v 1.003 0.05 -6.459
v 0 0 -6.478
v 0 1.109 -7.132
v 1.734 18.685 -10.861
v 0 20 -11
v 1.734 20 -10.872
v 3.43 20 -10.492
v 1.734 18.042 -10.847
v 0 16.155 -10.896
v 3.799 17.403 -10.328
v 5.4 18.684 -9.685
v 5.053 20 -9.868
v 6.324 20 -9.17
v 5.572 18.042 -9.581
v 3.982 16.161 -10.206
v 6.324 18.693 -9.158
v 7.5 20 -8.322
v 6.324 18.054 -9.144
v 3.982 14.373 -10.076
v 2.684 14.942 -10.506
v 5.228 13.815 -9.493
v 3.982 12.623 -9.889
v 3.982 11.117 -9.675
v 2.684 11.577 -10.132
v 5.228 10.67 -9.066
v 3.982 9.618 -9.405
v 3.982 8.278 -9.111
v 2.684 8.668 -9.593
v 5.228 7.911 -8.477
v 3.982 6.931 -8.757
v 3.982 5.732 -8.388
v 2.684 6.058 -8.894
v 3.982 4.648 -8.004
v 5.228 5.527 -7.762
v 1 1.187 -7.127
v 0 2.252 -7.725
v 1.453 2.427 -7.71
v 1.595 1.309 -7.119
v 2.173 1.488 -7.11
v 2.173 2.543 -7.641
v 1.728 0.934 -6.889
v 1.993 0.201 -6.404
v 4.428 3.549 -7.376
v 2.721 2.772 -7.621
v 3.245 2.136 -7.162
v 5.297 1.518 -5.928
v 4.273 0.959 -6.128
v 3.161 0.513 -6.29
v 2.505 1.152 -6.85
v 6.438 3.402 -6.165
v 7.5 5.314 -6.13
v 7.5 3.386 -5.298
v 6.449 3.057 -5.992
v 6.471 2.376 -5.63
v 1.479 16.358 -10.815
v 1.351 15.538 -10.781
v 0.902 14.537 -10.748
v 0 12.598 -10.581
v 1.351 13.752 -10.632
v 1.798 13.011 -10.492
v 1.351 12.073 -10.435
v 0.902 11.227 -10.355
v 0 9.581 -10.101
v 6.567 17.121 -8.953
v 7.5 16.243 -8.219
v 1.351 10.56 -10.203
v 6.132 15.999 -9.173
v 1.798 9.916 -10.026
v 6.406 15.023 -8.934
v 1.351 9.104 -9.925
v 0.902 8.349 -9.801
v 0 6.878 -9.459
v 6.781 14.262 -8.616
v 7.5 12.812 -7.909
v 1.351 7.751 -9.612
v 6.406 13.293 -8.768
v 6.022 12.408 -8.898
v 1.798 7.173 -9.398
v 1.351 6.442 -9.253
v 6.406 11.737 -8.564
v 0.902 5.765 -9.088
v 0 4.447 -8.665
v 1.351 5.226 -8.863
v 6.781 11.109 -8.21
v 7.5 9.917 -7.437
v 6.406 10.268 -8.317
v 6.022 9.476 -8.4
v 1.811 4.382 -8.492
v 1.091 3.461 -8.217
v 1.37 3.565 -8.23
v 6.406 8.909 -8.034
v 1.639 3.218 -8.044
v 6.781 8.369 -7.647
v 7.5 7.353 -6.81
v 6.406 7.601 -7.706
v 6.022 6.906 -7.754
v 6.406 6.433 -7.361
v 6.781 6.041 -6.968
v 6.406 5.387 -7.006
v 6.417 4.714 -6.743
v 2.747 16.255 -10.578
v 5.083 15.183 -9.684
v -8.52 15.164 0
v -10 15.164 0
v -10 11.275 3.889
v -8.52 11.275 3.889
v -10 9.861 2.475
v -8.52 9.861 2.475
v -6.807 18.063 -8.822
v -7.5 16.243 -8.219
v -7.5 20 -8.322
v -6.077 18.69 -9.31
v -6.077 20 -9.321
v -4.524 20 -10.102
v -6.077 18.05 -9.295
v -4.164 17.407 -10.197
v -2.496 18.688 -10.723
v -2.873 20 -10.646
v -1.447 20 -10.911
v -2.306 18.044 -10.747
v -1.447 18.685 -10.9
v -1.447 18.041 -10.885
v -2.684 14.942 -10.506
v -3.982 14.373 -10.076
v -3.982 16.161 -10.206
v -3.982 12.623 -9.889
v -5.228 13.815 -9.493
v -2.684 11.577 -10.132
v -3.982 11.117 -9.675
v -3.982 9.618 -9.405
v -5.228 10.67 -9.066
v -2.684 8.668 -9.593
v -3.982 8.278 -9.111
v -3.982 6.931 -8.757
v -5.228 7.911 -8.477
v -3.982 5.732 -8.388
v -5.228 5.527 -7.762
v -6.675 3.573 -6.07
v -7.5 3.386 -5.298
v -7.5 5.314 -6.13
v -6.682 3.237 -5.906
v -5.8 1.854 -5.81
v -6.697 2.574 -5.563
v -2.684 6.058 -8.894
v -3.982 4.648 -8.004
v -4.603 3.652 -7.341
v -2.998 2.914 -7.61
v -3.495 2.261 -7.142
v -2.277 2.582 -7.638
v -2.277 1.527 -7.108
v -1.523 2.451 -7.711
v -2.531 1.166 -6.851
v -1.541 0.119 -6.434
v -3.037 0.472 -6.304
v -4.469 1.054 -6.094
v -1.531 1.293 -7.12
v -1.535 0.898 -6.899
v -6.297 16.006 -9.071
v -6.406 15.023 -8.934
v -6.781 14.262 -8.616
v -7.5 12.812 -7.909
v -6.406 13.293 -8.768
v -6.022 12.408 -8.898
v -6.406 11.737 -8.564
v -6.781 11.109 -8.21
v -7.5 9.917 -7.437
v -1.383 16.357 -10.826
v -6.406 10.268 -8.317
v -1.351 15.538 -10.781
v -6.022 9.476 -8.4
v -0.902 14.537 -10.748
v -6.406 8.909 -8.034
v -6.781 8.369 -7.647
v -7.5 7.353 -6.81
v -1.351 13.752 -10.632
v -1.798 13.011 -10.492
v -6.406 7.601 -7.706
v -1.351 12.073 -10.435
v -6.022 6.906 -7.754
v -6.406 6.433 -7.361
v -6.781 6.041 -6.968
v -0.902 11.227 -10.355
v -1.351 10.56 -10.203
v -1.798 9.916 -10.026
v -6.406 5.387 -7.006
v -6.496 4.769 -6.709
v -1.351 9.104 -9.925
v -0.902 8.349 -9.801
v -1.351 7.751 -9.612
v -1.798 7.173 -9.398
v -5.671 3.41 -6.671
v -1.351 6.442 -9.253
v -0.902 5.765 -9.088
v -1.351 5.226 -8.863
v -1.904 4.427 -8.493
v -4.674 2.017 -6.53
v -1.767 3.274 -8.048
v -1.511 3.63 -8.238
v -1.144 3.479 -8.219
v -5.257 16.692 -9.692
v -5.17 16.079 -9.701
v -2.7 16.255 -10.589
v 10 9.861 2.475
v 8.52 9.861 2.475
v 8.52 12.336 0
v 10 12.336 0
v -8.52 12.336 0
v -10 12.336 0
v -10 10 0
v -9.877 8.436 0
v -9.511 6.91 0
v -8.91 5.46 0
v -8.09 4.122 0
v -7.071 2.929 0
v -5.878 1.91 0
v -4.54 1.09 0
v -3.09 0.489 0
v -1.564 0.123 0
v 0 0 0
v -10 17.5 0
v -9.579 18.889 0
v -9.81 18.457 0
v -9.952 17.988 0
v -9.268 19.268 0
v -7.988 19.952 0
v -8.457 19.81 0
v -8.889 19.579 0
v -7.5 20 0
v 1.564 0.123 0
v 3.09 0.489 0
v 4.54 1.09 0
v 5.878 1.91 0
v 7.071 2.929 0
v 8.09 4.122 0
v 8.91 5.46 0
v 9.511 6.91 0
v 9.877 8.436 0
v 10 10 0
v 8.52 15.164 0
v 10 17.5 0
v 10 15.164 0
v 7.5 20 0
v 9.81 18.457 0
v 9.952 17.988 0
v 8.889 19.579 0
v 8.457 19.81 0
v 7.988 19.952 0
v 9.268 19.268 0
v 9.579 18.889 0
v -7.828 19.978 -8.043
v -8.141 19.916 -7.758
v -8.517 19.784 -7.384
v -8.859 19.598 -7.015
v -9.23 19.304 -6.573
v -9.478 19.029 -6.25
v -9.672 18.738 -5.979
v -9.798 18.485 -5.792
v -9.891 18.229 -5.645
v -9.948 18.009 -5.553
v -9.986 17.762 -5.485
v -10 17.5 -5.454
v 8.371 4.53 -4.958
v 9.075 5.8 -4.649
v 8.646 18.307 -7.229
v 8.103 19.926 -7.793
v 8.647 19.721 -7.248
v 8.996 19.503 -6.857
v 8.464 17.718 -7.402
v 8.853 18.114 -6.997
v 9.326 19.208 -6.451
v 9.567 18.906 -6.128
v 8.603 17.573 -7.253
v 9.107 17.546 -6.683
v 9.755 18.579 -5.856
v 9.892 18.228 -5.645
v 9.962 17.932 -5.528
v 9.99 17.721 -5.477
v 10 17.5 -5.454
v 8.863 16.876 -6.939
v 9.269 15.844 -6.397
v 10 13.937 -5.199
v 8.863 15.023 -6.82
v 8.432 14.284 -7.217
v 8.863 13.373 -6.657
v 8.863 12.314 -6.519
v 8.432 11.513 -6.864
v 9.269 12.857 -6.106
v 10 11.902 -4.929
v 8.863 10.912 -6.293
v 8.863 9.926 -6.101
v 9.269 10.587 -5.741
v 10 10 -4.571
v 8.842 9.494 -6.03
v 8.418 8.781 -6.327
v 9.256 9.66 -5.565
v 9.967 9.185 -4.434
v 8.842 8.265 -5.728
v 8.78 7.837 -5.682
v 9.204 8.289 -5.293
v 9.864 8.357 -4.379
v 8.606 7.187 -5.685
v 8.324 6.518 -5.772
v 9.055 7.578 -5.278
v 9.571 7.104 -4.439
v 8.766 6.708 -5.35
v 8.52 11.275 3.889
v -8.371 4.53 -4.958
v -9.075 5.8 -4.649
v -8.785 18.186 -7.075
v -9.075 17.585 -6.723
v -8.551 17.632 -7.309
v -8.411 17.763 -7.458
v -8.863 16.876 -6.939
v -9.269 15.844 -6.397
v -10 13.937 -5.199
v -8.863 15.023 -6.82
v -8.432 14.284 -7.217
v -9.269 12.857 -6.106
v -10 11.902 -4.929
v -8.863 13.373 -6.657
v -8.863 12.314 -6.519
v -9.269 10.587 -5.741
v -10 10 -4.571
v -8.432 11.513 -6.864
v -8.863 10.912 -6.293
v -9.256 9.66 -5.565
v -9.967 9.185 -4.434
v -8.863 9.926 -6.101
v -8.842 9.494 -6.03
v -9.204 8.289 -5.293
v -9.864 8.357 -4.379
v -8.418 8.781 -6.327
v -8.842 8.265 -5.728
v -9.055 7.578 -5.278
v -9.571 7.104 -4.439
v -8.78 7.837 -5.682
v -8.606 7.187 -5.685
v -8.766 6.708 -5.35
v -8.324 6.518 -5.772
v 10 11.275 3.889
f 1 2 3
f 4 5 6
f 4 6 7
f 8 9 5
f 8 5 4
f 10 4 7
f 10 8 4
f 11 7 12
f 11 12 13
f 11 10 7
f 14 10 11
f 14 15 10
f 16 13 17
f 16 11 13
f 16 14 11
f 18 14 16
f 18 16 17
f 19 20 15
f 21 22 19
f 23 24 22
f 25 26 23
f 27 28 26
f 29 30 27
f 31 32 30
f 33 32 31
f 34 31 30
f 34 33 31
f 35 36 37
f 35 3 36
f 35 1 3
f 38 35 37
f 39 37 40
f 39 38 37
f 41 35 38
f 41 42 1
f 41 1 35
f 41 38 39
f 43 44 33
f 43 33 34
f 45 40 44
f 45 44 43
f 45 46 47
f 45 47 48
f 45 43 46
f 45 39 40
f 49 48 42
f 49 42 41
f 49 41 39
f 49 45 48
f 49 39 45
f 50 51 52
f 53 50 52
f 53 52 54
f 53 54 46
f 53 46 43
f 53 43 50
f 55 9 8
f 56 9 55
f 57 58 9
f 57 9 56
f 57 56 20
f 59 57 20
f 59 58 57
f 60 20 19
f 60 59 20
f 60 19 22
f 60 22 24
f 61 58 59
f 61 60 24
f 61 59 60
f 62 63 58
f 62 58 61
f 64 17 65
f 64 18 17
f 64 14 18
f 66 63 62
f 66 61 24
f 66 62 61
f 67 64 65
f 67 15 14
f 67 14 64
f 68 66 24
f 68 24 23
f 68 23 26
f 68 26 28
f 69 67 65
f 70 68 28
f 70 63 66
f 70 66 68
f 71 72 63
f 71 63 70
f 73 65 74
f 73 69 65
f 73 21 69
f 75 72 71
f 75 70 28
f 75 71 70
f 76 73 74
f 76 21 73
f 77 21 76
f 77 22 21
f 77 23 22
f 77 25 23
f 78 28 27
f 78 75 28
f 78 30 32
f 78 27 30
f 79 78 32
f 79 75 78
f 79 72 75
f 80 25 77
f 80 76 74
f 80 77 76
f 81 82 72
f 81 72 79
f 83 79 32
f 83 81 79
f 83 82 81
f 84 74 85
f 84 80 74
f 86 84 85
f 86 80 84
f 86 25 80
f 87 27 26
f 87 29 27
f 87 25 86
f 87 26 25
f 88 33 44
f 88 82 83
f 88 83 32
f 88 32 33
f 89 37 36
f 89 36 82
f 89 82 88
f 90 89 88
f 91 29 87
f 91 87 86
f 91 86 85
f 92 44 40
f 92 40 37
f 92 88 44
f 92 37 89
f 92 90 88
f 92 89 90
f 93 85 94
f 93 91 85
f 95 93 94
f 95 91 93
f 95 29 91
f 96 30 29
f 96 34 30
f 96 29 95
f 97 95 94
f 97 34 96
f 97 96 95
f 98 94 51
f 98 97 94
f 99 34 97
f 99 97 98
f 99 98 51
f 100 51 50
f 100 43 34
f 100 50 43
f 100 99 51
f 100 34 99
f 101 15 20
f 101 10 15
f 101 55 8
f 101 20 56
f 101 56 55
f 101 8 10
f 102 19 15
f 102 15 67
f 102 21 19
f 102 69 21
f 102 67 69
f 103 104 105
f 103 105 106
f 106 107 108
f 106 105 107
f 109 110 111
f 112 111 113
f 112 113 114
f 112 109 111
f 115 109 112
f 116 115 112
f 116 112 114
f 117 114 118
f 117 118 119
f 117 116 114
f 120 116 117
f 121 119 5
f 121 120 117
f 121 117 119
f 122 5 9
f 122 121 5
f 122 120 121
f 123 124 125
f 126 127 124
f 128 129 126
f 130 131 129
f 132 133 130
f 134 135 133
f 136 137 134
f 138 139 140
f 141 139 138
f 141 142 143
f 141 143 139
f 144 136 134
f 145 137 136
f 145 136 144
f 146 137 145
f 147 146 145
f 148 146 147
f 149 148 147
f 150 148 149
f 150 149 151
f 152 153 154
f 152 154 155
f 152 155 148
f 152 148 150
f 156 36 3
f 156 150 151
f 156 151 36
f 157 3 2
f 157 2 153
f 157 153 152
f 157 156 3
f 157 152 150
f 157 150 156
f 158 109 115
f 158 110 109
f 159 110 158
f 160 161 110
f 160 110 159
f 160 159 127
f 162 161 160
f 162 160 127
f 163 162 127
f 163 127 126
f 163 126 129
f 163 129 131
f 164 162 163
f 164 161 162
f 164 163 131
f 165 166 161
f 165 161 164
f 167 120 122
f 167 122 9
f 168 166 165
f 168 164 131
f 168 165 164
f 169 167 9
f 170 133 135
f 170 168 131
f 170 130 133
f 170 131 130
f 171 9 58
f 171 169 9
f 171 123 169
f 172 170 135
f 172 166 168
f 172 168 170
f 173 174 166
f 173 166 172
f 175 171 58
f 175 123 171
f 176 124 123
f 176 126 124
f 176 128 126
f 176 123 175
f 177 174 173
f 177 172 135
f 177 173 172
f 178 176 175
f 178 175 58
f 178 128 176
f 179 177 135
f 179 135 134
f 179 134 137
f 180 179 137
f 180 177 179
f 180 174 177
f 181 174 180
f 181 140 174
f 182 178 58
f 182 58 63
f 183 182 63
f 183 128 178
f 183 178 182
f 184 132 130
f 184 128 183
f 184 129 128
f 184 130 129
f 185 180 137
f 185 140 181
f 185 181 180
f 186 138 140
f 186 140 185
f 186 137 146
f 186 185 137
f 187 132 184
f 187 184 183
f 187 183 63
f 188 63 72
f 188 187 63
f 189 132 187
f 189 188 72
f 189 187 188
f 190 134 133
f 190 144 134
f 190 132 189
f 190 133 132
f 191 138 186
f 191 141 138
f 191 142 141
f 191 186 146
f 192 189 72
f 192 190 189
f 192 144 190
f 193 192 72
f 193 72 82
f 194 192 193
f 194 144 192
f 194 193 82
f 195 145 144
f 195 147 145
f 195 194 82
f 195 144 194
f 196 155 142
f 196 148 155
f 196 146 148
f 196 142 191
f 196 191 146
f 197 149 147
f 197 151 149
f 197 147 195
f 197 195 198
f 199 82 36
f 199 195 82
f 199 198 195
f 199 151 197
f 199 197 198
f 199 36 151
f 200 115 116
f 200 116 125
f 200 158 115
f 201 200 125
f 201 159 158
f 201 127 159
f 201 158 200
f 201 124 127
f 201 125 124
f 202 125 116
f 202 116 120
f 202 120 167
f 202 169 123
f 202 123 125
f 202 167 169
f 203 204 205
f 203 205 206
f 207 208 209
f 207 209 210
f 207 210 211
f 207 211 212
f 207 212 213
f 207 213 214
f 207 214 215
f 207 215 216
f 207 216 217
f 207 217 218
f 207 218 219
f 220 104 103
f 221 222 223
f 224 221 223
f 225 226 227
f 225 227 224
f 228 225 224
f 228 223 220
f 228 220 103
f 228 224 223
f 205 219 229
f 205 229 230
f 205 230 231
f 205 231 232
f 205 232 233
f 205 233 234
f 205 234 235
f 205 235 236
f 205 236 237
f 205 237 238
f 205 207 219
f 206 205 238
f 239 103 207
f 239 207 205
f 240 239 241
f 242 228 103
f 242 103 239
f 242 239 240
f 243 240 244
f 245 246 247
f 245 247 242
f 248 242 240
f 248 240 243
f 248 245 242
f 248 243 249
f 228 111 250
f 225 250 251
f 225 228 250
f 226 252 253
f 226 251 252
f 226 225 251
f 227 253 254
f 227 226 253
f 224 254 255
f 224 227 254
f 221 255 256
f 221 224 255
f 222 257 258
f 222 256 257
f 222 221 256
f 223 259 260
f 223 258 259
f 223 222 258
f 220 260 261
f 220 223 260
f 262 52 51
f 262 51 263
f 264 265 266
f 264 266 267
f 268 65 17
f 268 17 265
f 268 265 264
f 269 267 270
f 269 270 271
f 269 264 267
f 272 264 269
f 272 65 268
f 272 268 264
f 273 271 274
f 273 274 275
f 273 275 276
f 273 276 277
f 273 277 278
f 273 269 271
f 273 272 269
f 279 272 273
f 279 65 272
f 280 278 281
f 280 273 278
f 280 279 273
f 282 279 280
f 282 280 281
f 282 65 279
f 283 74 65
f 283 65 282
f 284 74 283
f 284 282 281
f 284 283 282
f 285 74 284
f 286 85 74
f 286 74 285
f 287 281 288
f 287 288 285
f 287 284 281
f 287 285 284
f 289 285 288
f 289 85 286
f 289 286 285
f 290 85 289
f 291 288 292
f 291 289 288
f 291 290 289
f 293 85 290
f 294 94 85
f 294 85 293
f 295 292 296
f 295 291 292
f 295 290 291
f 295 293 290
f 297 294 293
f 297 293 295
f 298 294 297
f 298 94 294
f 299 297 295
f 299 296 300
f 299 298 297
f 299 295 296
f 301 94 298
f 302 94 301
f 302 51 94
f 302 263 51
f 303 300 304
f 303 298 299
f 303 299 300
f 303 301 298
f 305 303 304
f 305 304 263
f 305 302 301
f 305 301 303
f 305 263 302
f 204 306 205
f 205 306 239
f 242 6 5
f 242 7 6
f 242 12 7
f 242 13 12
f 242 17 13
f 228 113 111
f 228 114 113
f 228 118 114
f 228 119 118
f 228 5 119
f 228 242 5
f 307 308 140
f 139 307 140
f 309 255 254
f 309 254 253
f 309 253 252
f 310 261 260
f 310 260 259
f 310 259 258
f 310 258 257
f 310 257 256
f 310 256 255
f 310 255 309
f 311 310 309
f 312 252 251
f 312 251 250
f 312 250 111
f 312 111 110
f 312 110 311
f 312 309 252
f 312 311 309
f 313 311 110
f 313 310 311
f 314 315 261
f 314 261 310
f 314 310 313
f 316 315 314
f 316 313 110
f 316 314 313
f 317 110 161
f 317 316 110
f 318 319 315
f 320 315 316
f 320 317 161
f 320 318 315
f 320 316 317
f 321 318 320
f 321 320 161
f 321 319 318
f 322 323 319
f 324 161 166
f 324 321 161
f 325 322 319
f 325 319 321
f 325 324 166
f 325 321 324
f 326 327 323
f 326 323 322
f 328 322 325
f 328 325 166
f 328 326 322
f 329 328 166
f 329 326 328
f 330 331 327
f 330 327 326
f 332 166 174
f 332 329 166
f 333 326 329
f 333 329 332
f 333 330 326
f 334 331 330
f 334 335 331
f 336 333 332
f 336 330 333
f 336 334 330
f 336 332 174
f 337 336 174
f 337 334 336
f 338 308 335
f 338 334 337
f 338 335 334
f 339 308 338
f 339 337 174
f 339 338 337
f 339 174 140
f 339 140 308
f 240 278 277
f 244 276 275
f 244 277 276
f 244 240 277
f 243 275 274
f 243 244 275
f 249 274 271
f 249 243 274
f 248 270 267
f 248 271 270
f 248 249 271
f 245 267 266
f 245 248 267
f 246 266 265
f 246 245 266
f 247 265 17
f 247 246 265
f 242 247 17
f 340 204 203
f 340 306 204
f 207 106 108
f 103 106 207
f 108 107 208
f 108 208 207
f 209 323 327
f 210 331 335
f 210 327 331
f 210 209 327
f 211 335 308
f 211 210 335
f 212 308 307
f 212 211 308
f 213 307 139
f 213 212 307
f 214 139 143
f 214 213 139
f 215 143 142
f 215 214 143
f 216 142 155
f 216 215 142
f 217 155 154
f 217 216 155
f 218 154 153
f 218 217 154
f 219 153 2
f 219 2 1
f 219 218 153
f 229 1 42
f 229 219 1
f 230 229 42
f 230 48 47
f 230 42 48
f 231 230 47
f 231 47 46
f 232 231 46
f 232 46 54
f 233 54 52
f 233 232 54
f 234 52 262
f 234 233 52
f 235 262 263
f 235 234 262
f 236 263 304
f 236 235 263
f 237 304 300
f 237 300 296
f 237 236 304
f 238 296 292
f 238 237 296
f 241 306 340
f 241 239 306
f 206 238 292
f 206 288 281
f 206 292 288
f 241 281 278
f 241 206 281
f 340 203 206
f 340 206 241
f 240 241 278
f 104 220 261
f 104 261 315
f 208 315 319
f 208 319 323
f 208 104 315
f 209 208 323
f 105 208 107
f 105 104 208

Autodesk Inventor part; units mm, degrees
ref_plane "YZ Plane" through (0, 0, 0) normal (1, 0, 0) x (0, 1, 0)
sketch "Imprint Transfer" plane through (0, 0, 0) normal (0, 0, 1) x (1, 0, 0)
  arc A0 (-10, 10) -> (10, 10) centre (0, 10) ccw
  line L0 (10, 10) -> (10, 17.5)
  arc A1 (10, 17.5) -> (7.5, 20) centre (7.5, 17.5) ccw
  line L1 (7.5, 20) -> (-7.5, 20)
  arc A2 (-7.5, 20) -> (-10, 17.5) centre (-7.5, 17.5) ccw
  line L2 (-10, 17.5) -> (-10, 10)
  point P0 (0, 0)
  point P1 (0, 7.0711)
sketch "Sketch2" plane through (0, 0, 0) normal (0, 0, 1) x (1, 0, 0)
  line L0 (-10, 17.5) -> (-10, 10) projected
  arc A0 (-10, 10) -> (10, 10) centre (0, 10) ccw projected
  line L1 (10, 10) -> (10, 17.5) projected
  arc A1 (10, 17.5) -> (7.5, 20) centre (7.5, 17.5) ccw projected
  line L2 (7.5, 20) -> (-7.5, 20) projected
  arc A2 (-7.5, 20) -> (-10, 17.5) centre (-7.5, 17.5) ccw projected
  point P0 (0, 0)
extrude "Extrusion1" add sketch "Sketch2" against normal blind 11
sketch "Rotational Axis" plane through (0, 0, 0) normal (0, 0, 1) x (1, 0, 0)
  arc A0 (-10, 10) -> (10, 10) centre (0, 10) ccw projected
  line L0 (10, 10) -> (10, 17.5) projected
  arc A1 (10, 17.5) -> (7.5, 20) centre (7.5, 17.5) ccw projected
  line L1 (7.5, 20) -> (-7.5, 20) projected
  arc A2 (-7.5, 20) -> (-10, 17.5) centre (-7.5, 17.5) ccw projected
  line L2 (-10, 17.5) -> (-10, 10) projected
  line L3 (-10, 10) -> (-10, 17.5) projected
  line L4 (-10, 13.75) -> (10, 13.75)
  line L5 (10, 17.5) -> (10, 10) projected
  point P0 (0, 0)
ref_plane "Dovetail Plane" through (-10, 13.75, 0) normal (0, -0.7071068, 0.7071068) x (1, 0, 0)
sketch "Sketch4" plane through (-10, 13.75, 0) normal (0, -0.7071068, 0.7071068) x (1, 0, 0)
  ellipse E0 centre (10, -2.6517) end of major axis (0, -2.6517) minor radius 7.0711 (0, -2.6517) -> (20, -2.6517) ccw projected
  line L0 (20, -2.6517) -> (20, 2.6517) projected
  ellipse E1 centre (17.5, 2.6517) end of major axis (20, 2.6517) minor radius 1.7678 (20, 2.6517) -> (17.5, 4.4194) ccw projected
  line L1 (17.5, 4.4194) -> (2.5, 4.4194) projected
  ellipse E2 centre (2.5, 2.6517) end of major axis (0, 2.6517) minor radius 1.7678 (2.5, 4.4194) -> (0, 2.6517) ccw projected
  line L2 (0, 2.6517) -> (0, -2.6517) projected
  line L3 (0, 0) -> (20, 0)
  line L4 (0, 1) -> (20, 1)
  line L5 (0, -1) -> (20, -1)
  line L6 (0, 1) -> (1.48, 1)
  line L7 (1.48, 1) -> (1.48, -1)
  line L8 (1.48, -1) -> (0, -1)
  line L9 (0, -1) -> (0, 1)
  line L10 (20, 1) -> (18.52, 1)
  line L11 (18.52, 1) -> (18.52, -1)
  line L12 (18.52, -1) -> (20, -1)
  line L13 (20, -1) -> (20, 1)
  point P0 (10, -9.7227)
  point P1 (1.48, 1)
  point P2 (0, 1)
  point P3 (0, -1)
  point P4 (1.48, -1)
  point P5 (18.52, 1)
  point P6 (18.52, -1)
  point P7 (20, -1)
  point P8 (20, 1)
  dimension "d3" = 1
  dimension "d4" = 1
  dimension "d5" = 1.48
  dimension "d6" = 2
  dimension "d7" = 1.48
  dimension "d8" = 2
  dimension "d13" = 0
  dimension "d14" = 0
extrude "Extrusion2" add sketch "Sketch4" along normal blind 4.5 and the other way blind 2 contours L2 L3 L7 L5 | L5 L11 L3 L0 | L2 L4 L7 L3 | L3 L11 L4 L0
sketch "Sketch6" plane through (-7.5, 20, 0) normal (0, 1, 0) x (1, 0, 0)
  line L0 (15, 0) -> (0, 0) projected
  line L1 (15, 0) -> (15, 11) projected
  line L2 (0, 11) -> (15, 11) projected
  line L3 (0, 0) -> (0, 11) projected
  line L4 (17.5, 0) -> (15, 0) projected
  line L5 (17.5, 0) -> (17.5, 11) projected
  line L6 (15, 11) -> (17.5, 11) projected
  line L7 (15, 0) -> (15, 11) projected
  line L8 (0, 0) -> (-2.5, 0) projected
  line L9 (0, 0) -> (0, 11) projected
  line L10 (-2.5, 11) -> (0, 11) projected
  line L11 (-2.5, 0) -> (-2.5, 11) projected
  line L12 (17.5, 0) -> (17.5, 11) projected
  line L13 (-2.5, 0) -> (-2.5, 11) projected
  arc A0 (17.5, 5.5) -> (-2.5, 5.5) centre (7.5, -0.8409) ccw
  line L14 (17.5, 11) -> (-2.5, 11)
  line L15 (-2.5, 11) -> (-2.5, 16)
  line L16 (-2.5, 16) -> (17.5, 16)
  line L17 (17.5, 16) -> (17.5, 11)
  point P0 (7.5, 0)
  point P1 (7.5, 11)
  point P2 (-2.5, 5.5)
  dimension "d27" = 20
  dimension "d28" = 5
ref_plane "MidPlane" through (0, 10, -11) normal (1, 0, 0) x (0, 0, -1)
sketch "GuideReference" plane through (0, 10, -11) normal (1, 0, 0) x (0, 0, -1)
  line L0 (-11, 0) -> (-11, 0) projected
  line L1 (-11, 0) -> (0, 0) projected
  line L2 (0, 0) -> (0, 0) projected
  line L3 (-11, 0) -> (0, 0) projected
  line L4 (-11, 10) -> (-11, 7.5) projected
  line L5 (-11, 10) -> (0, 10) projected
  line L6 (0, 7.5) -> (0, 10) projected
  line L7 (-11, 7.5) -> (0, 7.5) projected
  line L8 (-11, 7.5) -> (-11, 5.1642) projected
  line L9 (-11, 7.5) -> (0, 7.5) projected
  line L10 (0, 0) -> (0, 7.5) projected
  line L11 (-11, 0) -> (0, 0) projected
  line L12 (-11, 2.3358) -> (-11, 0) projected
  line L13 (-11, 2.3358) -> (-13.4749, -0.1391) projected
  line L14 (-14.8891, 1.2751) -> (-13.4749, -0.1391) projected
  line L15 (-11, 5.1642) -> (-14.8891, 1.2751) projected
  line L16 (-11.8409, -10) -> (-0.8409, -10) construction
  line L17 (-11.8409, 10) -> (-11.8409, -7.5)
  line L18 (-11.8409, 10) -> (5.6591, 10) construction
  line L19 (-11.8409, -7.5) -> (-18.8409, -7.5)
  line L20 (-18.8409, -7.5) -> (-22.8409, -7.5)
  line L21 (-11.8409, 10) -> (-11.8409, -7.5) construction
  line L22 (-11.8409, -7.5) -> (-18.8409, -7.5) construction
  line L23 (-18.8409, -7.5) -> (-22.8409, -7.5) construction
  spline S0 degree 3 poles (-11.8409, 10) (-11.8409, -7.5) (-18.8409, -7.5) (-22.8409, -7.5) knots 1 1 1 1 2 2 2 2
  point P0 (-11, -10)
  dimension "d24" = 17.5
  dimension "d25" = 90
  dimension "d26" = 7
sketch "Sketch10" plane through (0, 10, -11) normal (1, 0, 0) x (0, 0, -1)
  spline S0 degree 3 poles (-11.8409, 10) (-11.8409, -7.5) (-18.8409, -7.5) (-22.8409, -7.5) knots 1 1 1 1 2 2 2 2 projected
  point P0 (-11, -10)
sweep "Sweep2" cut profiles "Sketch6" path "Sketch10" contours A0 L2 L1 | L1 L6 L5 A0 | A0 L11 L10 L3 | L3 L2 A0 | L2 L10 L15 L16 L17 L6
properties part number "FingerTip Hardtip"
